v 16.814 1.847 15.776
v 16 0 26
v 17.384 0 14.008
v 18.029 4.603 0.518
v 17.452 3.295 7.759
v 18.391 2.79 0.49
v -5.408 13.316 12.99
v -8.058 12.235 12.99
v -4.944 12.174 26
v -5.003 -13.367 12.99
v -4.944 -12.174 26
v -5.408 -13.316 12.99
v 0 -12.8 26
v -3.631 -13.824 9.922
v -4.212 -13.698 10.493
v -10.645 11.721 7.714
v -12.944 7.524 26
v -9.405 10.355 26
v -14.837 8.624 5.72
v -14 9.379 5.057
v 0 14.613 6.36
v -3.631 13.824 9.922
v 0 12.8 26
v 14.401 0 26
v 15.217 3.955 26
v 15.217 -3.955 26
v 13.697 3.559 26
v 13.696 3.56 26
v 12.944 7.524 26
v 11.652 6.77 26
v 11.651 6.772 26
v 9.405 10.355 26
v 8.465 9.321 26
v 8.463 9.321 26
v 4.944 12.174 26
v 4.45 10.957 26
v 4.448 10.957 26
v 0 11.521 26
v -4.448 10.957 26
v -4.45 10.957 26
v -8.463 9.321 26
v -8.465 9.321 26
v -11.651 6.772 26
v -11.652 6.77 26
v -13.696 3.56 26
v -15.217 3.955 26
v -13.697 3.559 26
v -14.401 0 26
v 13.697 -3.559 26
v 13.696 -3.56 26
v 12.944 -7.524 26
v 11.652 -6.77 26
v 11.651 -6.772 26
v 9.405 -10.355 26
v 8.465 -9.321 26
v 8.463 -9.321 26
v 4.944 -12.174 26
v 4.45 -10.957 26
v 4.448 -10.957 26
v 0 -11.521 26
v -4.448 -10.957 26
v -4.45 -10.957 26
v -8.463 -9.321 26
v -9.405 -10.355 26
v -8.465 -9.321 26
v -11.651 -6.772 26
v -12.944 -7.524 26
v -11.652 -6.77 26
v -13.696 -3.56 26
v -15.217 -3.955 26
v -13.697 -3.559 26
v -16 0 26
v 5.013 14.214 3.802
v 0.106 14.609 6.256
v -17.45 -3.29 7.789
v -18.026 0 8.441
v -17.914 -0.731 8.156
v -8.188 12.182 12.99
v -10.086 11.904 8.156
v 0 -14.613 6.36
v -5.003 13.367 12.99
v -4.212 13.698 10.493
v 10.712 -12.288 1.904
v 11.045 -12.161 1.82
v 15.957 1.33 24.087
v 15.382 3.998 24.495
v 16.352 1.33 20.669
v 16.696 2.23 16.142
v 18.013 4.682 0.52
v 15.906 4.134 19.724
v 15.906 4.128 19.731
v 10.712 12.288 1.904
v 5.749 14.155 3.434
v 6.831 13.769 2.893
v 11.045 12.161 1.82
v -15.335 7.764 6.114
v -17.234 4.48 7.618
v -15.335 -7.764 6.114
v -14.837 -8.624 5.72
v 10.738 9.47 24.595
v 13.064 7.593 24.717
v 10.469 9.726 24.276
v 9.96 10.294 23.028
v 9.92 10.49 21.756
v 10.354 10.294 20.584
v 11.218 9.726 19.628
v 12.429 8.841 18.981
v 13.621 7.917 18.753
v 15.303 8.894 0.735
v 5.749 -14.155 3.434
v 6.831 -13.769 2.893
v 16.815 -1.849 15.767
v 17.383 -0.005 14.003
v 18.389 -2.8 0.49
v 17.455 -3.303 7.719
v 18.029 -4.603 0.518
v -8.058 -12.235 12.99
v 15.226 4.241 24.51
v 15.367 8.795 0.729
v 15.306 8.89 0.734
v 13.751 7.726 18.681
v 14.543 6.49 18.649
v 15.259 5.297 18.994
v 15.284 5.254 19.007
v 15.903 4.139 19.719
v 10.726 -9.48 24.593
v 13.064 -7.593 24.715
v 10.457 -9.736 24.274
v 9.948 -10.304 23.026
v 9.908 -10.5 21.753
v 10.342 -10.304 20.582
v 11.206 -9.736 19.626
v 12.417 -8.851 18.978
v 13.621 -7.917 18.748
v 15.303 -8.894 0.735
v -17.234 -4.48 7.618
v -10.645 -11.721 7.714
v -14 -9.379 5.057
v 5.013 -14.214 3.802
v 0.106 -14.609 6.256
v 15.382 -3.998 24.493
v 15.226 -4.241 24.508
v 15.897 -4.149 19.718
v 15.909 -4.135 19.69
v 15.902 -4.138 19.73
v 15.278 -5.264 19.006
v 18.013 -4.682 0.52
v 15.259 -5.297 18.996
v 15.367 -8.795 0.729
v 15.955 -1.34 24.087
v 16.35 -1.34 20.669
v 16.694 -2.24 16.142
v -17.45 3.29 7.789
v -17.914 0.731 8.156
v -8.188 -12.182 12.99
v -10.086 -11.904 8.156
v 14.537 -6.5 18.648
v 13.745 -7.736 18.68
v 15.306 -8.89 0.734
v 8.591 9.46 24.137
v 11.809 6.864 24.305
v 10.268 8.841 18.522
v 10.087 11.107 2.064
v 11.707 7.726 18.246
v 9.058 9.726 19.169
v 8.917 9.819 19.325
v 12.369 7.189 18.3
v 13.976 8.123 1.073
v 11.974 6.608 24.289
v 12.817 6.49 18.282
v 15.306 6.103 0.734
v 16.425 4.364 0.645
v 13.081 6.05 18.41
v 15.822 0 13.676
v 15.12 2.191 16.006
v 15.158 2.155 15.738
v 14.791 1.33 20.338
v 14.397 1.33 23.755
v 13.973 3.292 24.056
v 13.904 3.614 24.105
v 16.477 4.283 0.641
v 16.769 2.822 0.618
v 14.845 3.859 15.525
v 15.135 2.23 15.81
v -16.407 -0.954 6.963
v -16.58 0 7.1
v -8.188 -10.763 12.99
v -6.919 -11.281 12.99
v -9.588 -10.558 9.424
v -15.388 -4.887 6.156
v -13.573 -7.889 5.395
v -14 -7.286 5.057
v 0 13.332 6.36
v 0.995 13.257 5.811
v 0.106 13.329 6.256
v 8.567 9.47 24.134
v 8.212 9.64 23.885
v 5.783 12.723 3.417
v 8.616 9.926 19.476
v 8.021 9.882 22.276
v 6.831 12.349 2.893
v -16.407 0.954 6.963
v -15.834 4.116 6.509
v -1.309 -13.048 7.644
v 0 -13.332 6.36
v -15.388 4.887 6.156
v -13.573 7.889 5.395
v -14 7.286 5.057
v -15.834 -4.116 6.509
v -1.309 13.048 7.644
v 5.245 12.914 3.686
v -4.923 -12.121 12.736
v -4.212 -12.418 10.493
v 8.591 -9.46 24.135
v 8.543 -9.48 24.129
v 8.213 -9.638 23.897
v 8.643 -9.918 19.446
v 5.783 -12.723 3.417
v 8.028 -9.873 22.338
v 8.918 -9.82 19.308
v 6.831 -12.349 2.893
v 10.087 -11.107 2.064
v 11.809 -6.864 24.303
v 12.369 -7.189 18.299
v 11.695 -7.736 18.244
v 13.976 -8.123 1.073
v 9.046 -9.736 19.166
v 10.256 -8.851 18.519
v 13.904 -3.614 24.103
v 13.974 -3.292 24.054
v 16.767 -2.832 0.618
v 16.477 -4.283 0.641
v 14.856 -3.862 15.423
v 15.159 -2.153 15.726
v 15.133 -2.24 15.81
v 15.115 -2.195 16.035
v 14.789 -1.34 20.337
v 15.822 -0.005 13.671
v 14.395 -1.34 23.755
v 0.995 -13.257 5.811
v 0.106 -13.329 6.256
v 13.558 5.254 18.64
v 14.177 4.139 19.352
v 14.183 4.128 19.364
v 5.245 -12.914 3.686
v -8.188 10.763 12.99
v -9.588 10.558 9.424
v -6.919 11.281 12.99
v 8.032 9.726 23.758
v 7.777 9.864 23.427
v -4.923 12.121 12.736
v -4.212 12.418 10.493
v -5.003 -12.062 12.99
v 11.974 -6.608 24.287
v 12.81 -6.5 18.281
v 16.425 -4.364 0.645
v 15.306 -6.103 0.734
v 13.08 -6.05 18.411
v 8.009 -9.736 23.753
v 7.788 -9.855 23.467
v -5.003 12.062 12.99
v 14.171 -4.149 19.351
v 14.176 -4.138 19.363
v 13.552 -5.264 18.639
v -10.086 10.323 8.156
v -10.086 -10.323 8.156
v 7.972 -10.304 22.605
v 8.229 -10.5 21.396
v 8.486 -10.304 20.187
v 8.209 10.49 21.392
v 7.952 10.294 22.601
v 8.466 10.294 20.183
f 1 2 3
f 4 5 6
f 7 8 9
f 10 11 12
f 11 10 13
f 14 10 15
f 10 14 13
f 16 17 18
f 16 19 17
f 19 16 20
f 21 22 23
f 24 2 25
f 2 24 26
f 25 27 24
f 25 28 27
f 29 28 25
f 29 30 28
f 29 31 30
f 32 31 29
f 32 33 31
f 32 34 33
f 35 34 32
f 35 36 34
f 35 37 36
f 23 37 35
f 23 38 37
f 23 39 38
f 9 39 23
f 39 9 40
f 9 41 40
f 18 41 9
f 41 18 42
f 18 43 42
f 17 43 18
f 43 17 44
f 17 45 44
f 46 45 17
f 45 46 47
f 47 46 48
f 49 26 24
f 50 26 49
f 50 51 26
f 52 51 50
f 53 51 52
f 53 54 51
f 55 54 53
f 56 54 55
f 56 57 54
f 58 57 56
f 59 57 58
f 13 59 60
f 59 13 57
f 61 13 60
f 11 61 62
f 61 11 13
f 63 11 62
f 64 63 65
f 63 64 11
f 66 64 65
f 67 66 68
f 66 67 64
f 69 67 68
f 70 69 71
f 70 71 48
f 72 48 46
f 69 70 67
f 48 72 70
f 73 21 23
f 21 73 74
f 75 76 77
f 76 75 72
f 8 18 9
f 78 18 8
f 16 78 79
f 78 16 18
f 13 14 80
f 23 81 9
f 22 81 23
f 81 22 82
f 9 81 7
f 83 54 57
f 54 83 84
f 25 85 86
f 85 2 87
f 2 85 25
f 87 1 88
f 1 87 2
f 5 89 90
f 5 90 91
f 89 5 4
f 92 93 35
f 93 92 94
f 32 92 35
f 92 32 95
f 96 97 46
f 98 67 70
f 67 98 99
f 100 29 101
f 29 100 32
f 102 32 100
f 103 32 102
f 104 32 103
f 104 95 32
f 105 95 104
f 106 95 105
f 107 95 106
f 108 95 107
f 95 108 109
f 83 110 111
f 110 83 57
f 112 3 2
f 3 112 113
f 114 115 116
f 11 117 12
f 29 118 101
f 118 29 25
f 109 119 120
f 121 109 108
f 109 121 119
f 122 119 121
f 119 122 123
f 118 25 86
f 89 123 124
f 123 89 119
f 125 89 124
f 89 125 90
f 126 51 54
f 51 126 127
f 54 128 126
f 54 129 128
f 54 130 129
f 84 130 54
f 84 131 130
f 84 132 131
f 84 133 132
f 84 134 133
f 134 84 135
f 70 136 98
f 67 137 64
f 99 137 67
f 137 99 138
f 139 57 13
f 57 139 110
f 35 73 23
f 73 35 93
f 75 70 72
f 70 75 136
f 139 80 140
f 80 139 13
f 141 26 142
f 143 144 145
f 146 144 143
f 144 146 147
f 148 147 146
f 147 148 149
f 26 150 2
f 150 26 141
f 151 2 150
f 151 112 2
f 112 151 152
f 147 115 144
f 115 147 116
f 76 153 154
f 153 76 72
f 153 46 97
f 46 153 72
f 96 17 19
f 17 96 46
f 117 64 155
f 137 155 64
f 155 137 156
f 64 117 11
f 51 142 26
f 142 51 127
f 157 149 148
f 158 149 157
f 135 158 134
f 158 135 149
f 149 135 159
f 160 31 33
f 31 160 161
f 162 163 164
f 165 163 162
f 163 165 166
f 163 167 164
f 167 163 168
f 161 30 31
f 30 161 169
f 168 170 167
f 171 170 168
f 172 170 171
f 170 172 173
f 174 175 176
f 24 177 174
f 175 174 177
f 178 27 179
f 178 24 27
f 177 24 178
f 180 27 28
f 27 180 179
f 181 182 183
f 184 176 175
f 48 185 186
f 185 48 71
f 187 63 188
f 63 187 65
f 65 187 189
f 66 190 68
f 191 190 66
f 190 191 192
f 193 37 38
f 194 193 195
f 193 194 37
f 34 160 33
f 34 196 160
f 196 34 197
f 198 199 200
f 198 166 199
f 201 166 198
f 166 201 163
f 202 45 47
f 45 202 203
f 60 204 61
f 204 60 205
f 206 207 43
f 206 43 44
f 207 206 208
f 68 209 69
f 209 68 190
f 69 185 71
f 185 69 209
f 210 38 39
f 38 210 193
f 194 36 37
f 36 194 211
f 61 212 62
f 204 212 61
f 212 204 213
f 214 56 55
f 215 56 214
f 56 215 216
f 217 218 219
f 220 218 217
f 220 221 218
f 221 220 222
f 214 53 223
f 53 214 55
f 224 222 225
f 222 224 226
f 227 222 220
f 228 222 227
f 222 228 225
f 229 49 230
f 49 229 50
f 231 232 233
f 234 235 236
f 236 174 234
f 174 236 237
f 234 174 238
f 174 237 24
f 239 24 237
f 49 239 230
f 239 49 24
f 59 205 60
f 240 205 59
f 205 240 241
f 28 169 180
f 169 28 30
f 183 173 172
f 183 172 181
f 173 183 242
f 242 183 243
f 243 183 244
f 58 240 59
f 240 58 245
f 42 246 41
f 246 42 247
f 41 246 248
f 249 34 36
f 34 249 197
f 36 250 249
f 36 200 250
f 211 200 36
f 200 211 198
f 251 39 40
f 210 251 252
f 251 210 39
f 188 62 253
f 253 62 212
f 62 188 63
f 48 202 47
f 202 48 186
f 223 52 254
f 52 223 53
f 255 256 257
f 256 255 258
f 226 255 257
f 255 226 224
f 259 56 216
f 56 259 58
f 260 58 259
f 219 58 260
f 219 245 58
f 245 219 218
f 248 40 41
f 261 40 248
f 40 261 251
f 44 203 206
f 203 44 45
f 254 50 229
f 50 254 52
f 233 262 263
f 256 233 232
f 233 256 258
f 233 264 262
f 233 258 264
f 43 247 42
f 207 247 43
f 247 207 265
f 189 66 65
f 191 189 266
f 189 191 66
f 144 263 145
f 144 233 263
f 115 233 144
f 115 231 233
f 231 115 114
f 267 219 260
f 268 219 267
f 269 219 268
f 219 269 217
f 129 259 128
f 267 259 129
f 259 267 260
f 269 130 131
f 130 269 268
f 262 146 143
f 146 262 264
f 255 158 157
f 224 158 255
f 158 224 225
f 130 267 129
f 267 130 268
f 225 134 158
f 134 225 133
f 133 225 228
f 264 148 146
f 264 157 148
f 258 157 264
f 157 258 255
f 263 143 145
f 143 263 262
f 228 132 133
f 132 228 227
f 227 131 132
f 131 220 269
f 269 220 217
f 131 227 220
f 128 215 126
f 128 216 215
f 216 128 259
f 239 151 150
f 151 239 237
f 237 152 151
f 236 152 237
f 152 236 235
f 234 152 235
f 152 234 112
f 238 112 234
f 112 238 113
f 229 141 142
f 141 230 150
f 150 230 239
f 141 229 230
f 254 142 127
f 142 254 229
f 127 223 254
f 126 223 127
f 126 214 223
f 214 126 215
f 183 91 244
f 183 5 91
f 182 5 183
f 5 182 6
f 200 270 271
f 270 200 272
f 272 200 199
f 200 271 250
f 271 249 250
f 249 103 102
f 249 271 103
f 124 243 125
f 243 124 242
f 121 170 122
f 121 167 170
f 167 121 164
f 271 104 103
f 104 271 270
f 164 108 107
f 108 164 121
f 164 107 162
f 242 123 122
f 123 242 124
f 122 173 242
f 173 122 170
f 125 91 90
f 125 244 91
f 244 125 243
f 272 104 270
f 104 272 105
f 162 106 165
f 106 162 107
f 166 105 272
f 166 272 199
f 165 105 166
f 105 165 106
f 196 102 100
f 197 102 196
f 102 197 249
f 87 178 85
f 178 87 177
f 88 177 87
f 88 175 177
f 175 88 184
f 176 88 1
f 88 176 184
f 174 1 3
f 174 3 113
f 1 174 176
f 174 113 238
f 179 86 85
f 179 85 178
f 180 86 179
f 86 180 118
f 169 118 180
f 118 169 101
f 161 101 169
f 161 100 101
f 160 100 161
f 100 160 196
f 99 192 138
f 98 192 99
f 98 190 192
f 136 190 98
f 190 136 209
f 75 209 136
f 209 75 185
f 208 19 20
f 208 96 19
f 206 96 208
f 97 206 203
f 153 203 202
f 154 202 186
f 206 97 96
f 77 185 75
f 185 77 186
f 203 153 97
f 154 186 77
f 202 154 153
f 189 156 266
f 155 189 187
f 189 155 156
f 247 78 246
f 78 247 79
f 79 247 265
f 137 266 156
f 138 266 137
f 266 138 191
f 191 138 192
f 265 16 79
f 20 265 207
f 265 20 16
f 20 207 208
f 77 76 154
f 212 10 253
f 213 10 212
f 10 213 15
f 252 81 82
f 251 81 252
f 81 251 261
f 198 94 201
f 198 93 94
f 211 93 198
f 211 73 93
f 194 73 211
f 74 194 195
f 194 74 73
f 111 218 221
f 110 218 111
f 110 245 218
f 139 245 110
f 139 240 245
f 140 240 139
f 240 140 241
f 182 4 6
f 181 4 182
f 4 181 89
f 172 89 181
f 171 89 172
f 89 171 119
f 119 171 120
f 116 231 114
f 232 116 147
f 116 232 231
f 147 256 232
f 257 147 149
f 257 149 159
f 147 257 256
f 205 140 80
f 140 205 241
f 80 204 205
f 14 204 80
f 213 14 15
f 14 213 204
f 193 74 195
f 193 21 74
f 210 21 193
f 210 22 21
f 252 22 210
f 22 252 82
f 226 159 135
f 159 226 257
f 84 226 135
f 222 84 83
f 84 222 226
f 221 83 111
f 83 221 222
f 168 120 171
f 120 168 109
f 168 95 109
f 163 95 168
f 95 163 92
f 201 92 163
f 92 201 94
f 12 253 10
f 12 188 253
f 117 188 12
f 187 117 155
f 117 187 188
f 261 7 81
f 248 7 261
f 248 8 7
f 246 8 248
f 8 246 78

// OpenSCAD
//plum
//skull
//nasal
//visor
$fn = 20;
TOLERANCE=0.01;

HEAD_RADIUS = 16;
SHOULDER_RADIUS = 19;
HELM_HEIGHT=26;
HEAD_SCALE=[1,0.8,1];
HELM_THICK = 1.6;

VISOR_WIDTH=9;

generate_plum = false;
generate_skull = false;
print_tube = true;

SR = 4;
TH = 10;
SC=0.4;

module down(how)
{
    translate([0, 0, -how]) children();
}

module hollow_cylinder(r1, r2, h, t)
{
    difference()
    {
	cylinder(r1 = r1, r2 = r2, h = h);
	down(TOLERANCE)
	{
	    cylinder(r1 = r1 - t, r2 = r2 - t, h = h + TOLERANCE * 2);
	}
    }
}

module hollow_half_sphere(r, t)
{
    __wide = r * 2*1.02;
    down(2)difference()
    {
        sphere(r = r*1.01);
	down(TOLERANCE)
	sphere(r=r-t);
        translate([-__wide/2, -__wide/2, -__wide + 2])
	{
	    cube([__wide, __wide, __wide]);
	}
    }
}

module rim(r,t,h)
{
    difference()
    {
	hollow_half_sphere(r,t);
	ZT=2;
	BW=8;
	translate([-r,BW/2,ZT]) cube([r*2.2,r*2.2,r*2]);
	translate([-r,-r*2-BW/2,ZT]) cube([r*2,r*2,r*2]);
    }
}

module plum_holder(R,w,D,add=0)
{
    r = R + 4;

    difference()
    {
	hollow_half_sphere(r,w);
	translate([-r,w/2,0]) cube([r*2,r*2,r]);
	translate([-r,-r*2-w/2,0]) cube([r*2,r*2,r]);
	rotate([0,360-10,0])
	{
	    translate([0,-r,7]) rotate([0,70-D,0]) cube([r*2,r*2,r]);
	    translate([0,-r,0]) rotate([0,180+25+D,0]) cube([r*2,r*2,r]);
	}
    }
}

module plum(R, w, D)
{
    ADD=6;
    r=R+4+ADD;
    difference()
    {
	hollow_half_sphere(r,w+ADD);
	translate([-r,w/2,0]) cube([r*2,r*2,r]);
	translate([-r,-r*2-w/2,0]) cube([r*2,r*2,r]);
	rotate([0,360-10,0])
	{
	    translate([0,-r,7]) rotate([0,70-D,0]) cube([r*2,r*2,r]);
	    translate([0,-r,0]) rotate([0,180+25+D,0]) cube([r*2,r*2,r]);
	}
    }
}

module h_arc(radius, head_scale, t)
{
    scale(head_scale)
    {
	hollow_half_sphere(radius,t);
	rim(radius+0.6, 1, 2);
    }
    difference()
    {
	plum_holder(HEAD_RADIUS,6,0);
	plum_holder(HEAD_RADIUS+2,4,2);
	translate([-HEAD_RADIUS*2, -HEAD_RADIUS*2, -HEAD_RADIUS+TOLERANCE*2]) cube([HEAD_RADIUS*4,HEAD_RADIUS*4,HEAD_RADIUS]);
    }
}

if(generate_plum)
{
    translate([0,0,HELM_HEIGHT])
    {
	if(false)difference()
	{
	    plum_holder(HEAD_RADIUS,6,0);
	    plum_holder(HEAD_RADIUS+2,4,2);
	    //translate([-HEAD_RADIUS*2, -HEAD_RADIUS*2, -HEAD_RADIUS+TOLERANCE*2]) cube([HEAD_RADIUS*4,HEAD_RADIUS*4,HEAD_RADIUS]);
	}
	color([1,0,0]) plum(HEAD_RADIUS+2, 4, 2);
    }
}

module frustrum(w, s, t)
{
    rotate([90, 0, 180])
    {
	uw = (s / 2);
	scale([-w,w,1]) linear_extrude(height = t)
	{
            polygon([[0.5,-0.5], [0,0], [uw,1], [uw,2], [0.5,2]]);
	}
    }
}

module h_tube(head_radius, shoulder_radius, helm_height, thick, head_scale)
{
    scale(head_scale)
    {
	hollow_cylinder(shoulder_radius, head_radius, helm_height, thick);
    }
    visor_rim();
}

module visor_rim()
{
}

module visor(w, h, t)
{
    nose_h = h / 5;
    nose_w = w / 6;

    difference()
    {
	union()
	{
	    XX=w/2;
	    LIST=[[SC*XX,0], [XX, 0], [XX,h], [0,h]];
	    translate([0,t,0]) rotate([90,0,0]) linear_extrude(height=t) polygon(LIST);
	    translate([-2,t,h-2]) rotate([90,0,0])
	    {
		cylinder(r = SR, h = t);
	    }
	}
	union()
	{
	    translate([w/2 - w/4 + TOLERANCE,-TOLERANCE,h-nose_h-w/2+0.8]) frustrum(w/2, 0.4, t+TOLERANCE*2);
	}
	translate([-3,t+1,h-2]) rotate([90,0,0])
	{
	    translate([-SR,3,-TOLERANCE])rotate([0,0,-11]) down(TOLERANCE)cube([SR*3,SR*3,SR*3+TOLERANCE*2]);
	}
    }
}

module full_visor()
{
    visor(VISOR_WIDTH, HELM_HEIGHT, TH);
    translate([VISOR_WIDTH-TOLERANCE, 0, 0]) scale([-1,1,1])visor(VISOR_WIDTH, HELM_HEIGHT, TH+TOLERANCE*2);
}

module bottom_negative()
{
    scale([2,2,1]) difference()
    {
	BH = HELM_HEIGHT / 2;
	cube([SHOULDER_RADIUS,SHOULDER_RADIUS,BH]);
	union()
	{
	    translate([2.5,0,SHOULDER_RADIUS*3.6]) scale([1,1,10]) rotate([-90,0,0]) down(TOLERANCE) cylinder(r=SHOULDER_RADIUS/3,h=SHOULDER_RADIUS + TOLERANCE*2);
	    translate([SHOULDER_RADIUS*1.15,0,SHOULDER_RADIUS*0.8]) rotate([-90,0,0]) down(TOLERANCE) cylinder(r=SHOULDER_RADIUS*0.8,h=SHOULDER_RADIUS + TOLERANCE*2);
	}
    }
}

color([213/256,195/256,171/256])
difference()
{
    union()
    {
	if(generate_skull) translate([0,0,HELM_HEIGHT]) h_arc(HEAD_RADIUS, HEAD_SCALE, HELM_THICK);

	if(print_tube) h_tube(HEAD_RADIUS, SHOULDER_RADIUS,HELM_HEIGHT, HELM_THICK, HEAD_SCALE);
    }

    if(generate_skull||print_tube)
    {
	translate([4+SHOULDER_RADIUS,0-VISOR_WIDTH/2,0]) rotate([-12,0,90]) full_visor();
	translate([-SHOULDER_RADIUS,-SHOULDER_RADIUS,-TOLERANCE]) bottom_negative();
    }
}
